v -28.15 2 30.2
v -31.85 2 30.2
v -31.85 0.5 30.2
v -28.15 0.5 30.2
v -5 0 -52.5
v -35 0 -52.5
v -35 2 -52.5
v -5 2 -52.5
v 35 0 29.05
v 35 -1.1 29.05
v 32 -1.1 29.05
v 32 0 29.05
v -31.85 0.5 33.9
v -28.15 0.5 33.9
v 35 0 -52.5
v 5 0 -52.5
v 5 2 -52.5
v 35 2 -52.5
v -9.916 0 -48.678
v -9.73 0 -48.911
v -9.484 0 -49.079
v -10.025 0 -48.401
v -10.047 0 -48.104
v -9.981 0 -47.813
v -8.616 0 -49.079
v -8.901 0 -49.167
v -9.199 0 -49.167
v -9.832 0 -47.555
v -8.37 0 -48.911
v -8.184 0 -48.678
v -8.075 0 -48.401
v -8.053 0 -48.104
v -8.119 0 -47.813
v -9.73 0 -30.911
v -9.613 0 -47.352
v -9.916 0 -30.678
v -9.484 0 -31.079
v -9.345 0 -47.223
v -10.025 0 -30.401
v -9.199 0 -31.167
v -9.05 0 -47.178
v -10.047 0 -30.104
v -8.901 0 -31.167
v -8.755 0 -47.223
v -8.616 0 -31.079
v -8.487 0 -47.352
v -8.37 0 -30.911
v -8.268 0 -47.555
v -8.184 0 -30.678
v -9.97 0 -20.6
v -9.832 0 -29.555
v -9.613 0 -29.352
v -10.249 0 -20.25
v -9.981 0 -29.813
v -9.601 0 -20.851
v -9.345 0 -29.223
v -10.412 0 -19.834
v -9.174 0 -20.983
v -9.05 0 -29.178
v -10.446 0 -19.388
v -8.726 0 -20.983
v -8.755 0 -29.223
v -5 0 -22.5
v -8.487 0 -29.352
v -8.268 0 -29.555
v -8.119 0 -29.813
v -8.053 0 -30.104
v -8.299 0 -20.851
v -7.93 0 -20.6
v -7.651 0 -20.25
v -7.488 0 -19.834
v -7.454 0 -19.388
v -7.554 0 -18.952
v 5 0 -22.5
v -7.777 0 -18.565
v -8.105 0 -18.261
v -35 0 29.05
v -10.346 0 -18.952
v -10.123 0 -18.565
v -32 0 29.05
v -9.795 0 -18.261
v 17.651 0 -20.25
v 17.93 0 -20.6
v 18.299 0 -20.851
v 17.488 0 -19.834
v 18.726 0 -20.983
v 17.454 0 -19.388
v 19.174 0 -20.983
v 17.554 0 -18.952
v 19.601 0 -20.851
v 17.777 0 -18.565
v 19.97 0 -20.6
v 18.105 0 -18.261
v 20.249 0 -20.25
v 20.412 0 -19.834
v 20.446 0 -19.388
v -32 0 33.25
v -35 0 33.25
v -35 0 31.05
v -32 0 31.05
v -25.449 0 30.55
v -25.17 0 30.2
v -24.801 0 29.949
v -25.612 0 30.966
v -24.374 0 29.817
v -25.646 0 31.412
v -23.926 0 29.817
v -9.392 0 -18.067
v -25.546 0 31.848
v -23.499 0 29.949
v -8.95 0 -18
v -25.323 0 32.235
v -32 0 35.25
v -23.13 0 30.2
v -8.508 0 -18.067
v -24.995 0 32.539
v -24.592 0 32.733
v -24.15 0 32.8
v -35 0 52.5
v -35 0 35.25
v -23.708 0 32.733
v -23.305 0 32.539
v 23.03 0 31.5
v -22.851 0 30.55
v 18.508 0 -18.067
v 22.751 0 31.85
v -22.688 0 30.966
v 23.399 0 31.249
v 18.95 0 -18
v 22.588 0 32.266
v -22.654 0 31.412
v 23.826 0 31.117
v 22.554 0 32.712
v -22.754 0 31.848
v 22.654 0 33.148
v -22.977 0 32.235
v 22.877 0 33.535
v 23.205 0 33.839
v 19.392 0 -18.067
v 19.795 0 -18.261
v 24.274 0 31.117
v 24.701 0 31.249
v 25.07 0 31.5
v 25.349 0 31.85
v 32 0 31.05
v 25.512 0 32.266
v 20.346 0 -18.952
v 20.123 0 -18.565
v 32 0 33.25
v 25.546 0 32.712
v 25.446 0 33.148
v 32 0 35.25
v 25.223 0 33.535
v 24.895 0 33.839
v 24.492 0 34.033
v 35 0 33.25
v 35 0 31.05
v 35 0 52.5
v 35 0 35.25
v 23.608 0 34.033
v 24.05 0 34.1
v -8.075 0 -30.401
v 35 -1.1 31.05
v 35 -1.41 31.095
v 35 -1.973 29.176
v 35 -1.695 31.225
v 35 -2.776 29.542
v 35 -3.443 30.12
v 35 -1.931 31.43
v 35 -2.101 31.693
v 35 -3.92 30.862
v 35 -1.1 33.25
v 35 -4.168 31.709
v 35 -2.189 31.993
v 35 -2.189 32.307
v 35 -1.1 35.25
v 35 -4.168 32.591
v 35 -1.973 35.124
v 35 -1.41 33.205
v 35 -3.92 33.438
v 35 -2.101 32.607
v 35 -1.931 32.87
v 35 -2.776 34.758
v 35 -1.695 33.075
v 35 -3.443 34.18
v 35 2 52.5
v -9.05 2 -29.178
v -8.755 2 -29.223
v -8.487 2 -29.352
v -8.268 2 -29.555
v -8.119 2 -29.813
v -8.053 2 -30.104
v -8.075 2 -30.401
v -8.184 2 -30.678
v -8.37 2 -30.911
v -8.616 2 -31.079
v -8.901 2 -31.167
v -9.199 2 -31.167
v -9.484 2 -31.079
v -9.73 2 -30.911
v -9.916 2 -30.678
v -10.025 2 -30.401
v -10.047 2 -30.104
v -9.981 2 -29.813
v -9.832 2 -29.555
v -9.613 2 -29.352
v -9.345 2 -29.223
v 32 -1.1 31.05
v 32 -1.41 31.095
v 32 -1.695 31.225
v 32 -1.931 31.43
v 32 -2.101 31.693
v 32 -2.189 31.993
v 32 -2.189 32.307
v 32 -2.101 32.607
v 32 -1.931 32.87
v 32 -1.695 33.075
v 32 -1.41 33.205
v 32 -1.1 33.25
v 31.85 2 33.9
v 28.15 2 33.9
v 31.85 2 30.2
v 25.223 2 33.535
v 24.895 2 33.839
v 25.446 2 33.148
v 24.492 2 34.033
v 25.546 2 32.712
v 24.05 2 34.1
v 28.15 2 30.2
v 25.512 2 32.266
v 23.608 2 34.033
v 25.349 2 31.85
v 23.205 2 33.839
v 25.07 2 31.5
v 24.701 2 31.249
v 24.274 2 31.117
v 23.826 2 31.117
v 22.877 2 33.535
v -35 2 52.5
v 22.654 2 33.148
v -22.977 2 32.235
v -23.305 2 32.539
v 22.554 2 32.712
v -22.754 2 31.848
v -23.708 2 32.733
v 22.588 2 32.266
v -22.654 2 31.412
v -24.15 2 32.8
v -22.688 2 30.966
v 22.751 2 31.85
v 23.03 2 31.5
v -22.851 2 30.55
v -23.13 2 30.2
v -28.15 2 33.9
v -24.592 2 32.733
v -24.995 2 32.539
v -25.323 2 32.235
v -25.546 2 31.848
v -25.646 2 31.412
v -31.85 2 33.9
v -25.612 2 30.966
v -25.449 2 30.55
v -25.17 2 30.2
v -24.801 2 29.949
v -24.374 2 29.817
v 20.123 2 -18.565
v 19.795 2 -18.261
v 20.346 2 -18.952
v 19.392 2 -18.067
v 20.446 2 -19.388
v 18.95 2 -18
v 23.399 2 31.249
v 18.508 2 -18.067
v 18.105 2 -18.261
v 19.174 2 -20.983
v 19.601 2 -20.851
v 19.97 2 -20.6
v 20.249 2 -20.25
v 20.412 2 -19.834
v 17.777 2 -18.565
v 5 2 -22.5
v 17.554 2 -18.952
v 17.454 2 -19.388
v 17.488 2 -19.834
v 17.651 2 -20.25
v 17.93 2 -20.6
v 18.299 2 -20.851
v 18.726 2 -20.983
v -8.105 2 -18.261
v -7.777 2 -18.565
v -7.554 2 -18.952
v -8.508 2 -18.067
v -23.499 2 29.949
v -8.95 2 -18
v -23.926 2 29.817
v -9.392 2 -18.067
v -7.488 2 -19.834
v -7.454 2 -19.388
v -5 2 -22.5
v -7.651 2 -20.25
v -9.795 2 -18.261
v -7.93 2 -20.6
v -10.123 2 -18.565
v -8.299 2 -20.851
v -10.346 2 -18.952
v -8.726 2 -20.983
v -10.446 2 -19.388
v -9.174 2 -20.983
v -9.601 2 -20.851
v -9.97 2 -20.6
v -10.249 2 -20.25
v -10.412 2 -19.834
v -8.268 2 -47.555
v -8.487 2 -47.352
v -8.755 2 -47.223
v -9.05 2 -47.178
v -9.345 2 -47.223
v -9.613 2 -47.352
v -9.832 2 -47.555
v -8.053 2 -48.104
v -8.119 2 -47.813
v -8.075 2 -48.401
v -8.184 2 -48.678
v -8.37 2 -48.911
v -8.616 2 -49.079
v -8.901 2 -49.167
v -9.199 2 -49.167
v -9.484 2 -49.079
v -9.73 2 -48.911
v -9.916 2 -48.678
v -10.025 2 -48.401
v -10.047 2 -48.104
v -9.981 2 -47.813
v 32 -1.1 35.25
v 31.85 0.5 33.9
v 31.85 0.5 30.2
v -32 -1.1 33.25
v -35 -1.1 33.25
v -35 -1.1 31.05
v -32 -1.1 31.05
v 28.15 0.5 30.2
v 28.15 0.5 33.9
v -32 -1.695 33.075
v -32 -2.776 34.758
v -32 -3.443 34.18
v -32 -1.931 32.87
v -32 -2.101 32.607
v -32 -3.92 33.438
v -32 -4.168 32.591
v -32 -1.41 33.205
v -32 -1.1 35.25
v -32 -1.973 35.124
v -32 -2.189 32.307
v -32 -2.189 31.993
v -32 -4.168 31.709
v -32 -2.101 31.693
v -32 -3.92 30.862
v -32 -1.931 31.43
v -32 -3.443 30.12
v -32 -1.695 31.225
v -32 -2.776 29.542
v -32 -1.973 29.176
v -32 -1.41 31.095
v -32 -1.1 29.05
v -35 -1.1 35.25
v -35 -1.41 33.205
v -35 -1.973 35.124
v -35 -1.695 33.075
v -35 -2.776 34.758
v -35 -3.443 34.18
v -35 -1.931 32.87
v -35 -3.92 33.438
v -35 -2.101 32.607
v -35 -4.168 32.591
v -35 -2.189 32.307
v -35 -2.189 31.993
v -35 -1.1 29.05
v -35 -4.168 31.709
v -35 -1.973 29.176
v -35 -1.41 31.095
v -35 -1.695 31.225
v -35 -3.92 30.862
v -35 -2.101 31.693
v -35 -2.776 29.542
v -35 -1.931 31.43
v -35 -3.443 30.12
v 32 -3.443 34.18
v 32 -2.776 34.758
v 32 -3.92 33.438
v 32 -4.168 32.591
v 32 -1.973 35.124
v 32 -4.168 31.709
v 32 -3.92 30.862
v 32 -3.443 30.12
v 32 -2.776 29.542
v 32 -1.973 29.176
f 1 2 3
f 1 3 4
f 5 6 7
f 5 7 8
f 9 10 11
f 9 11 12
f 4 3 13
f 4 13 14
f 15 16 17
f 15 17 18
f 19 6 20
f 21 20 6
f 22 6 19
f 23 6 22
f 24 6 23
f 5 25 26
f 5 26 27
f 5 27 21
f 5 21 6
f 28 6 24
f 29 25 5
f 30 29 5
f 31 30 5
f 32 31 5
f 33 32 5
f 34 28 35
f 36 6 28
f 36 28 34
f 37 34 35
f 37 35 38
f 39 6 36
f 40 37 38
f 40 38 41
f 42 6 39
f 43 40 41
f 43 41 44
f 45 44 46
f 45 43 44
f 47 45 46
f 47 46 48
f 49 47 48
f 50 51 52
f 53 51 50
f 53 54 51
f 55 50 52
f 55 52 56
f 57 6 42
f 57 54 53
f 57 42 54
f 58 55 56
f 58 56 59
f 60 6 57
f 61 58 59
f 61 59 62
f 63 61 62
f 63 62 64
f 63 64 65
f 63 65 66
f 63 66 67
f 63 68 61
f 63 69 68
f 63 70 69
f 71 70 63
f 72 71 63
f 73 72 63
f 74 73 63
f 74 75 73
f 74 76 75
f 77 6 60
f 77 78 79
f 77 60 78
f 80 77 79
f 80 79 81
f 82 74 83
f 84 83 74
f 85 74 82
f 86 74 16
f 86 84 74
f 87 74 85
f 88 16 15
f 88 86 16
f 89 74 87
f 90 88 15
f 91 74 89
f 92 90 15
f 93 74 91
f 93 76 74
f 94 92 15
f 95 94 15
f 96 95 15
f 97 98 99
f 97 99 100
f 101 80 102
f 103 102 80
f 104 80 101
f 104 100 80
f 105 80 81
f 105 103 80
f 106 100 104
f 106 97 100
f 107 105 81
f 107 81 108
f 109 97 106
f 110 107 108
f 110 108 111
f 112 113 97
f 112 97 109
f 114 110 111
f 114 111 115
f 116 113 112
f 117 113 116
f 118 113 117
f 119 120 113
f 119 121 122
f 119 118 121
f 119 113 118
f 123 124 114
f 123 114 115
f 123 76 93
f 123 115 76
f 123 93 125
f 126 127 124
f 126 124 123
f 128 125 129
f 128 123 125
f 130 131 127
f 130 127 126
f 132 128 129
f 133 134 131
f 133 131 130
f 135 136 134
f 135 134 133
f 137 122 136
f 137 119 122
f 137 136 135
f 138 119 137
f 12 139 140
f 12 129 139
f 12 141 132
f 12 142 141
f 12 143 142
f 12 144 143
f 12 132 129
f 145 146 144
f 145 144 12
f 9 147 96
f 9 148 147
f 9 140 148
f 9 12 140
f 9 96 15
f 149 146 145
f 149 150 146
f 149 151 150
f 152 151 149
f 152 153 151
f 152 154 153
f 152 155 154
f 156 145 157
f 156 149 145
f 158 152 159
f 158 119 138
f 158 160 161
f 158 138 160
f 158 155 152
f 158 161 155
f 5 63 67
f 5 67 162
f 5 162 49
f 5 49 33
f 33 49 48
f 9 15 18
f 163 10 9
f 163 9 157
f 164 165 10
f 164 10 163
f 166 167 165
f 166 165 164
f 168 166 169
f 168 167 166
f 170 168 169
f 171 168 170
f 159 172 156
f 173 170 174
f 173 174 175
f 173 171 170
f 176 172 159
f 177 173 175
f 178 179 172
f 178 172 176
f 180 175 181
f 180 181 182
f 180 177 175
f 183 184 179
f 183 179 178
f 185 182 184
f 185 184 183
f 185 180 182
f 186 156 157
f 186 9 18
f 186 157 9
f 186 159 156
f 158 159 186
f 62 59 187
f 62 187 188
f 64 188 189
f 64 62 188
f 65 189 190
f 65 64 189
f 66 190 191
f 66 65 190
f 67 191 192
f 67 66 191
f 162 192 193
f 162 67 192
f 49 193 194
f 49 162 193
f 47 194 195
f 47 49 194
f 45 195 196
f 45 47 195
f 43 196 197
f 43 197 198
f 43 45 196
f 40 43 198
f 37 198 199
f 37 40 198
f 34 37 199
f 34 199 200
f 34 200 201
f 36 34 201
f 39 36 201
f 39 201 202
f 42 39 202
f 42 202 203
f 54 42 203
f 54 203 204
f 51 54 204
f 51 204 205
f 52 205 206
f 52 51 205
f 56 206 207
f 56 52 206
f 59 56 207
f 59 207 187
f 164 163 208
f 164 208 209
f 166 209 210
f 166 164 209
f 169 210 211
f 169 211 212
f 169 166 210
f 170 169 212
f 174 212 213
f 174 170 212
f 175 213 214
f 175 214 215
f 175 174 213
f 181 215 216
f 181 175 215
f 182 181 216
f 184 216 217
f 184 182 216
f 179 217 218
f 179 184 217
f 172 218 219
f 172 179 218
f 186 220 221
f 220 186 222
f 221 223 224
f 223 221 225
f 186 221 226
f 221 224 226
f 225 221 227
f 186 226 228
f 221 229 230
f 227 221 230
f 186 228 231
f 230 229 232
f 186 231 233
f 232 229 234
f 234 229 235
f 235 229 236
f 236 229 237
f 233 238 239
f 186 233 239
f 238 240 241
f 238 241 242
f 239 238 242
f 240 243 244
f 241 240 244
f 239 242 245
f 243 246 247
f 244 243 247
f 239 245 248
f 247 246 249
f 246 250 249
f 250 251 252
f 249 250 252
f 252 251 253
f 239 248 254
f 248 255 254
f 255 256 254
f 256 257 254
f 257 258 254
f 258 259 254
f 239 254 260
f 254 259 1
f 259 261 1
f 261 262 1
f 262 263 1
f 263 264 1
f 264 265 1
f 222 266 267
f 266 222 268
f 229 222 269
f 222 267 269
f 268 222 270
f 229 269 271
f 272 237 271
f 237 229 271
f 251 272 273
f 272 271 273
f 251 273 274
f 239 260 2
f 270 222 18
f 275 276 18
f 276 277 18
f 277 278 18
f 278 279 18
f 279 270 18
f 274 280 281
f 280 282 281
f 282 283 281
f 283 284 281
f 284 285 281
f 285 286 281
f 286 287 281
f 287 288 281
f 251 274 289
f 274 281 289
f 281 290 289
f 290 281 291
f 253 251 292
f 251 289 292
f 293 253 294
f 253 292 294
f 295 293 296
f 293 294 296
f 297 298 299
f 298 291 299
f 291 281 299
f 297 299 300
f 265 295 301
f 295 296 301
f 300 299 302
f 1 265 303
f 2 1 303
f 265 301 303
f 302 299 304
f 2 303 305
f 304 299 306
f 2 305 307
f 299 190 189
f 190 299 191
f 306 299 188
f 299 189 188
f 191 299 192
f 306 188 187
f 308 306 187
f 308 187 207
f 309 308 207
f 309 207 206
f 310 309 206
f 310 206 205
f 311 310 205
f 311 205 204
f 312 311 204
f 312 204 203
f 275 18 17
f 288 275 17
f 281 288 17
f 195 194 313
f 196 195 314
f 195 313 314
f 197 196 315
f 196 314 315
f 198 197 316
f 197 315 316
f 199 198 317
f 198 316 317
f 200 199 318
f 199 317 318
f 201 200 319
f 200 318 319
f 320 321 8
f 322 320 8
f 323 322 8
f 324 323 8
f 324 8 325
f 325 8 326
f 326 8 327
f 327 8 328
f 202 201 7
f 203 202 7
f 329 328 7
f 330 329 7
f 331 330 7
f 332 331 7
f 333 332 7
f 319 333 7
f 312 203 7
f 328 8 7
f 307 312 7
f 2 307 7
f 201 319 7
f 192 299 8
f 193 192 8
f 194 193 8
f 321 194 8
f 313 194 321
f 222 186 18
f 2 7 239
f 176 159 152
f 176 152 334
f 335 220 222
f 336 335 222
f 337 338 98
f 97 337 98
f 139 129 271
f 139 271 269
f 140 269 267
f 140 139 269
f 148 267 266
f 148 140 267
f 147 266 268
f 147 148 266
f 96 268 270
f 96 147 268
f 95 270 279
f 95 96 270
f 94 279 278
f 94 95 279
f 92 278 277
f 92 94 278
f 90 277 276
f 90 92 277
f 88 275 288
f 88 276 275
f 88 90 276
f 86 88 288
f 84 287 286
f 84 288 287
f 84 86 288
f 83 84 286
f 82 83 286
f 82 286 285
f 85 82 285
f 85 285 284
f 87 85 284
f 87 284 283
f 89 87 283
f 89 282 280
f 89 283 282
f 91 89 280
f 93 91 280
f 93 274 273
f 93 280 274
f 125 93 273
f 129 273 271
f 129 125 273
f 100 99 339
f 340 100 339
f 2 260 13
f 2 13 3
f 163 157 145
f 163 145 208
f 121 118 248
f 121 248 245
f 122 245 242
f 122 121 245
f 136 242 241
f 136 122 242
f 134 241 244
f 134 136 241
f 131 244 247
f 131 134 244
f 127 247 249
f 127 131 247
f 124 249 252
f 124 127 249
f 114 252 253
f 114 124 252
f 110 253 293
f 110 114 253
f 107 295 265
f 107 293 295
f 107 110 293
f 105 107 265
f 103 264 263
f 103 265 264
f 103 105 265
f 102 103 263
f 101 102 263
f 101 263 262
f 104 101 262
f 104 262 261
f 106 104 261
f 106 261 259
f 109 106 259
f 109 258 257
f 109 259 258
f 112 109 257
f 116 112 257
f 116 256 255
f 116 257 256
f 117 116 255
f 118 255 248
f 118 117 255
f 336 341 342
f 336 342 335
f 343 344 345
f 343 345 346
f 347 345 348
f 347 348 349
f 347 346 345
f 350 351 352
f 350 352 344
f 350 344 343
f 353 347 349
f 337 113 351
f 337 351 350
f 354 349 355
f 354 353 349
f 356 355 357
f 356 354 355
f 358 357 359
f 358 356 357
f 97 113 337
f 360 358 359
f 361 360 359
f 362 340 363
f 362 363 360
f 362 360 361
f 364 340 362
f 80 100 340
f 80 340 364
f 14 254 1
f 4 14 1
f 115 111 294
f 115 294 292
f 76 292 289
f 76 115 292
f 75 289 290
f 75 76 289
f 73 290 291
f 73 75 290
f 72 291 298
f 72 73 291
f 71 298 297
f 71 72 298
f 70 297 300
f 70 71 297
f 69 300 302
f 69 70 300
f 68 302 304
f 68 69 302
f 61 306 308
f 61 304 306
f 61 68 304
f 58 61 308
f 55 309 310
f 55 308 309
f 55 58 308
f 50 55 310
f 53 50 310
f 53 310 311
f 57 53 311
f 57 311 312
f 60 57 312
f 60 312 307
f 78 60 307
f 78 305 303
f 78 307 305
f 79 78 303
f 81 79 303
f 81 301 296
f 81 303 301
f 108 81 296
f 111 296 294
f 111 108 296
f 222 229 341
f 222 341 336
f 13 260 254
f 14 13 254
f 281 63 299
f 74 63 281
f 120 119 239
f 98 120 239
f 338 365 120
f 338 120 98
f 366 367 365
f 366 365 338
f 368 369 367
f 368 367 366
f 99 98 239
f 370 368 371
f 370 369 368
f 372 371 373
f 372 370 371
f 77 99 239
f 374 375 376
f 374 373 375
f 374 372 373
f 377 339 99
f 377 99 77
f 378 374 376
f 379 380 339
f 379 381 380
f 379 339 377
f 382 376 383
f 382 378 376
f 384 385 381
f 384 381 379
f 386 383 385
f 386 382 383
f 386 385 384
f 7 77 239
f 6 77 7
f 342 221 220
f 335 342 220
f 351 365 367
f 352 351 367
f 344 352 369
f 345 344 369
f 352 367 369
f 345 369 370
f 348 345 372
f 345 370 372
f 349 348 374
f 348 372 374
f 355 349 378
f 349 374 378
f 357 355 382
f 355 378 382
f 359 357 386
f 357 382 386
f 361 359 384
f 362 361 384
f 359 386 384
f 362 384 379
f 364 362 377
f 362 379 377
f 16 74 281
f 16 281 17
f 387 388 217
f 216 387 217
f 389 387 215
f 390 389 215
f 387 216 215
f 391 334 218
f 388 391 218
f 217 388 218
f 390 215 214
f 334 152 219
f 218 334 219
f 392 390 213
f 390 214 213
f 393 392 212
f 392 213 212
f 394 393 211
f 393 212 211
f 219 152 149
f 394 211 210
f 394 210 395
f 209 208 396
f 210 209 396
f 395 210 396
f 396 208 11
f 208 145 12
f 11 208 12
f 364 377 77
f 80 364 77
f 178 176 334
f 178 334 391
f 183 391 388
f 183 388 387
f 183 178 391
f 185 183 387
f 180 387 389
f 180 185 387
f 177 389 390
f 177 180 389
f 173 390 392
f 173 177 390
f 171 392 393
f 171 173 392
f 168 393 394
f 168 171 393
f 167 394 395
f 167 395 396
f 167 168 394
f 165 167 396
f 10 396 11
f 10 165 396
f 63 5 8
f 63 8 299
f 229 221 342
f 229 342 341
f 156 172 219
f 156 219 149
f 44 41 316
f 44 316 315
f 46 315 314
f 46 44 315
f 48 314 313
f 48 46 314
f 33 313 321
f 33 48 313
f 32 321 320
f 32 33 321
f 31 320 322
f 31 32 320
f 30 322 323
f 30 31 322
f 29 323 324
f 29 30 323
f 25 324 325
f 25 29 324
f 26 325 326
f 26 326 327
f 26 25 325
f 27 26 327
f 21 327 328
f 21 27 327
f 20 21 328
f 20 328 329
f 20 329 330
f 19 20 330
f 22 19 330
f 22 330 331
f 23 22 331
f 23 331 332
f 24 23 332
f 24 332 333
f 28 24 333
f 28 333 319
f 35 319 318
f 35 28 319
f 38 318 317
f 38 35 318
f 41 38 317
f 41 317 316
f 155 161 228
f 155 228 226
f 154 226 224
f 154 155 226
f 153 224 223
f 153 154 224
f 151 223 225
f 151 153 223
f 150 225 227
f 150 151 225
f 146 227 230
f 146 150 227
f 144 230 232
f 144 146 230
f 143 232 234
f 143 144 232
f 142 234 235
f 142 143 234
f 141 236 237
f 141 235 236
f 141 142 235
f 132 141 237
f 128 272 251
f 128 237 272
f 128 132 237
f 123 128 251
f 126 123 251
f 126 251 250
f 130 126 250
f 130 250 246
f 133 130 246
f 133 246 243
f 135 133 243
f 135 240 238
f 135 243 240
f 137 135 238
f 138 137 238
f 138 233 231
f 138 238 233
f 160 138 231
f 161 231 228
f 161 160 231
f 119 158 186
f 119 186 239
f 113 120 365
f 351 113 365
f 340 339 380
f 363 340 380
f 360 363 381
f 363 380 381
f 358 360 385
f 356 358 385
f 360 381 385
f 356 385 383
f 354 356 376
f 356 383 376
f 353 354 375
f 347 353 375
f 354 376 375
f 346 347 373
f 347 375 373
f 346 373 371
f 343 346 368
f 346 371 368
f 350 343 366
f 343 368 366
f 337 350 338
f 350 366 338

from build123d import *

# Parameters (mm, degrees)
SKETCH1_R               = 1
SKETCH1_W               = 3.1
SKETCH1_H               = 3.1
BOSS_EXTRUDE1_DEPTH     = 2
BOSS_EXTRUDE2_DEPTH     = 3
SKETCH4_W               = 3.1
SKETCH4_H               = 3.1
BOSS_EXTRUDE3_DEPTH     = 0.5
SKETCH5_W               = 3.7
SKETCH5_H               = 3.7
CUT_EXTRUDE1_DEPTH      = 1.5
CUT_EXTRUDE2_DEPTH      = 64.401025228
CUT_EXTRUDE2_DEPTH_BACK = 64.401025228
SKETCH6_R               = 1.5


with BuildPart() as part:
    # Sketch1 → Boss-Extrude1 (new body)
    with BuildSketch(Plane(origin=(0, 0, 0), x_dir=(1, 0, 0), z_dir=(0, 1, 0))):
        Polygon((-5, 52.5), (-5, 22.5), (5, 22.5), (5, 52.5), (35, 52.5), (35, -52.5), (-35, -52.5), (-35, 52.5), align=None)
        with Locations(Location((-9.049911388, 48.178259549, 0), (0, 0, 270))):
            Circle(SKETCH1_R, mode=Mode.SUBTRACT)
        with Locations(Location((-9.049911388, 30.178259549, 0), (0, 0, 270))):
            Circle(SKETCH1_R, mode=Mode.SUBTRACT)
        with Locations((-30, -32.05)):
            Rectangle(SKETCH1_W, SKETCH1_H, mode=Mode.SUBTRACT)
        with Locations((30, -32.05)):
            Rectangle(SKETCH1_W, SKETCH1_H, mode=Mode.SUBTRACT)
    extrude(amount=BOSS_EXTRUDE1_DEPTH)

    # Sketch3 → Boss-Extrude2 (add)
    with BuildSketch(Plane(origin=(35, 0, 0), x_dir=(0, 0, -1), z_dir=(1, 0, 0))):
        with BuildLine():
            Line((-33.25, 0), (-35.25, 0))
            Line((-35.25, 0), (-35.25, -1.1))
            ThreePointArc((-35.25, -1.1), (-32.15, -4.2), (-29.05, -1.1))
            Line((-29.05, -1.1), (-29.05, 0))
            Line((-29.05, 0), (-31.05, 0))
            Line((-31.05, 0), (-31.05, -1.1))
            ThreePointArc((-31.05, -1.1), (-32.15, -2.2), (-33.25, -1.1))
            Line((-33.25, -1.1), (-33.25, 0))
        make_face()
    boss_extrude2 = extrude(amount=-BOSS_EXTRUDE2_DEPTH)

    # Mirror1: Boss-Extrude2 across plane
    add(boss_extrude2.mirror(Plane(origin=(0, 0, 0), x_dir=(0, 0, 1), z_dir=(1, 0, 0))))

    # Sketch4 → Boss-Extrude3 (add)
    with BuildSketch(Plane.XZ):
        with Locations((-30, 32.05)):
            Rectangle(SKETCH4_W, SKETCH4_H)
        with Locations((30, 32.05)):
            Rectangle(SKETCH4_W, SKETCH4_H)
    extrude(amount=-BOSS_EXTRUDE3_DEPTH)

    # Sketch5 → Cut-Extrude1 (cut)
    with BuildSketch(Plane(origin=(0, 2, 0), x_dir=(1, 0, 0), z_dir=(0, 1, 0))):
        with Locations((-30, -32.05)):
            Rectangle(SKETCH5_W, SKETCH5_H)
        with Locations((30, -32.05)):
            Rectangle(SKETCH5_W, SKETCH5_H)
    extrude(amount=-CUT_EXTRUDE1_DEPTH, mode=Mode.SUBTRACT)

    # Sketch6 → Cut-Extrude2 (cut, two sides: drawn at the far end of the back side and taken through both)
    with BuildSketch(Plane(origin=(0, 2, 0), x_dir=(1, 0, 0), z_dir=(0, 1, 0)).offset(-CUT_EXTRUDE2_DEPTH_BACK)):
        with Locations(Location((-8.95, 19.5, 0), (0, 0, 270))):
            Circle(SKETCH6_R)
        with Locations(Location((18.95, 19.5, 0), (0, 0, 270))):
            Circle(SKETCH6_R)
        with Locations(Location((24.05, -32.6, 0), (0, 0, 270))):
            Circle(SKETCH6_R)
        with Locations(Location((-24.15, -31.3, 0), (0, 0, 270))):
            Circle(SKETCH6_R)
    extrude(amount=CUT_EXTRUDE2_DEPTH + CUT_EXTRUDE2_DEPTH_BACK, mode=Mode.SUBTRACT)


solid = part.part
